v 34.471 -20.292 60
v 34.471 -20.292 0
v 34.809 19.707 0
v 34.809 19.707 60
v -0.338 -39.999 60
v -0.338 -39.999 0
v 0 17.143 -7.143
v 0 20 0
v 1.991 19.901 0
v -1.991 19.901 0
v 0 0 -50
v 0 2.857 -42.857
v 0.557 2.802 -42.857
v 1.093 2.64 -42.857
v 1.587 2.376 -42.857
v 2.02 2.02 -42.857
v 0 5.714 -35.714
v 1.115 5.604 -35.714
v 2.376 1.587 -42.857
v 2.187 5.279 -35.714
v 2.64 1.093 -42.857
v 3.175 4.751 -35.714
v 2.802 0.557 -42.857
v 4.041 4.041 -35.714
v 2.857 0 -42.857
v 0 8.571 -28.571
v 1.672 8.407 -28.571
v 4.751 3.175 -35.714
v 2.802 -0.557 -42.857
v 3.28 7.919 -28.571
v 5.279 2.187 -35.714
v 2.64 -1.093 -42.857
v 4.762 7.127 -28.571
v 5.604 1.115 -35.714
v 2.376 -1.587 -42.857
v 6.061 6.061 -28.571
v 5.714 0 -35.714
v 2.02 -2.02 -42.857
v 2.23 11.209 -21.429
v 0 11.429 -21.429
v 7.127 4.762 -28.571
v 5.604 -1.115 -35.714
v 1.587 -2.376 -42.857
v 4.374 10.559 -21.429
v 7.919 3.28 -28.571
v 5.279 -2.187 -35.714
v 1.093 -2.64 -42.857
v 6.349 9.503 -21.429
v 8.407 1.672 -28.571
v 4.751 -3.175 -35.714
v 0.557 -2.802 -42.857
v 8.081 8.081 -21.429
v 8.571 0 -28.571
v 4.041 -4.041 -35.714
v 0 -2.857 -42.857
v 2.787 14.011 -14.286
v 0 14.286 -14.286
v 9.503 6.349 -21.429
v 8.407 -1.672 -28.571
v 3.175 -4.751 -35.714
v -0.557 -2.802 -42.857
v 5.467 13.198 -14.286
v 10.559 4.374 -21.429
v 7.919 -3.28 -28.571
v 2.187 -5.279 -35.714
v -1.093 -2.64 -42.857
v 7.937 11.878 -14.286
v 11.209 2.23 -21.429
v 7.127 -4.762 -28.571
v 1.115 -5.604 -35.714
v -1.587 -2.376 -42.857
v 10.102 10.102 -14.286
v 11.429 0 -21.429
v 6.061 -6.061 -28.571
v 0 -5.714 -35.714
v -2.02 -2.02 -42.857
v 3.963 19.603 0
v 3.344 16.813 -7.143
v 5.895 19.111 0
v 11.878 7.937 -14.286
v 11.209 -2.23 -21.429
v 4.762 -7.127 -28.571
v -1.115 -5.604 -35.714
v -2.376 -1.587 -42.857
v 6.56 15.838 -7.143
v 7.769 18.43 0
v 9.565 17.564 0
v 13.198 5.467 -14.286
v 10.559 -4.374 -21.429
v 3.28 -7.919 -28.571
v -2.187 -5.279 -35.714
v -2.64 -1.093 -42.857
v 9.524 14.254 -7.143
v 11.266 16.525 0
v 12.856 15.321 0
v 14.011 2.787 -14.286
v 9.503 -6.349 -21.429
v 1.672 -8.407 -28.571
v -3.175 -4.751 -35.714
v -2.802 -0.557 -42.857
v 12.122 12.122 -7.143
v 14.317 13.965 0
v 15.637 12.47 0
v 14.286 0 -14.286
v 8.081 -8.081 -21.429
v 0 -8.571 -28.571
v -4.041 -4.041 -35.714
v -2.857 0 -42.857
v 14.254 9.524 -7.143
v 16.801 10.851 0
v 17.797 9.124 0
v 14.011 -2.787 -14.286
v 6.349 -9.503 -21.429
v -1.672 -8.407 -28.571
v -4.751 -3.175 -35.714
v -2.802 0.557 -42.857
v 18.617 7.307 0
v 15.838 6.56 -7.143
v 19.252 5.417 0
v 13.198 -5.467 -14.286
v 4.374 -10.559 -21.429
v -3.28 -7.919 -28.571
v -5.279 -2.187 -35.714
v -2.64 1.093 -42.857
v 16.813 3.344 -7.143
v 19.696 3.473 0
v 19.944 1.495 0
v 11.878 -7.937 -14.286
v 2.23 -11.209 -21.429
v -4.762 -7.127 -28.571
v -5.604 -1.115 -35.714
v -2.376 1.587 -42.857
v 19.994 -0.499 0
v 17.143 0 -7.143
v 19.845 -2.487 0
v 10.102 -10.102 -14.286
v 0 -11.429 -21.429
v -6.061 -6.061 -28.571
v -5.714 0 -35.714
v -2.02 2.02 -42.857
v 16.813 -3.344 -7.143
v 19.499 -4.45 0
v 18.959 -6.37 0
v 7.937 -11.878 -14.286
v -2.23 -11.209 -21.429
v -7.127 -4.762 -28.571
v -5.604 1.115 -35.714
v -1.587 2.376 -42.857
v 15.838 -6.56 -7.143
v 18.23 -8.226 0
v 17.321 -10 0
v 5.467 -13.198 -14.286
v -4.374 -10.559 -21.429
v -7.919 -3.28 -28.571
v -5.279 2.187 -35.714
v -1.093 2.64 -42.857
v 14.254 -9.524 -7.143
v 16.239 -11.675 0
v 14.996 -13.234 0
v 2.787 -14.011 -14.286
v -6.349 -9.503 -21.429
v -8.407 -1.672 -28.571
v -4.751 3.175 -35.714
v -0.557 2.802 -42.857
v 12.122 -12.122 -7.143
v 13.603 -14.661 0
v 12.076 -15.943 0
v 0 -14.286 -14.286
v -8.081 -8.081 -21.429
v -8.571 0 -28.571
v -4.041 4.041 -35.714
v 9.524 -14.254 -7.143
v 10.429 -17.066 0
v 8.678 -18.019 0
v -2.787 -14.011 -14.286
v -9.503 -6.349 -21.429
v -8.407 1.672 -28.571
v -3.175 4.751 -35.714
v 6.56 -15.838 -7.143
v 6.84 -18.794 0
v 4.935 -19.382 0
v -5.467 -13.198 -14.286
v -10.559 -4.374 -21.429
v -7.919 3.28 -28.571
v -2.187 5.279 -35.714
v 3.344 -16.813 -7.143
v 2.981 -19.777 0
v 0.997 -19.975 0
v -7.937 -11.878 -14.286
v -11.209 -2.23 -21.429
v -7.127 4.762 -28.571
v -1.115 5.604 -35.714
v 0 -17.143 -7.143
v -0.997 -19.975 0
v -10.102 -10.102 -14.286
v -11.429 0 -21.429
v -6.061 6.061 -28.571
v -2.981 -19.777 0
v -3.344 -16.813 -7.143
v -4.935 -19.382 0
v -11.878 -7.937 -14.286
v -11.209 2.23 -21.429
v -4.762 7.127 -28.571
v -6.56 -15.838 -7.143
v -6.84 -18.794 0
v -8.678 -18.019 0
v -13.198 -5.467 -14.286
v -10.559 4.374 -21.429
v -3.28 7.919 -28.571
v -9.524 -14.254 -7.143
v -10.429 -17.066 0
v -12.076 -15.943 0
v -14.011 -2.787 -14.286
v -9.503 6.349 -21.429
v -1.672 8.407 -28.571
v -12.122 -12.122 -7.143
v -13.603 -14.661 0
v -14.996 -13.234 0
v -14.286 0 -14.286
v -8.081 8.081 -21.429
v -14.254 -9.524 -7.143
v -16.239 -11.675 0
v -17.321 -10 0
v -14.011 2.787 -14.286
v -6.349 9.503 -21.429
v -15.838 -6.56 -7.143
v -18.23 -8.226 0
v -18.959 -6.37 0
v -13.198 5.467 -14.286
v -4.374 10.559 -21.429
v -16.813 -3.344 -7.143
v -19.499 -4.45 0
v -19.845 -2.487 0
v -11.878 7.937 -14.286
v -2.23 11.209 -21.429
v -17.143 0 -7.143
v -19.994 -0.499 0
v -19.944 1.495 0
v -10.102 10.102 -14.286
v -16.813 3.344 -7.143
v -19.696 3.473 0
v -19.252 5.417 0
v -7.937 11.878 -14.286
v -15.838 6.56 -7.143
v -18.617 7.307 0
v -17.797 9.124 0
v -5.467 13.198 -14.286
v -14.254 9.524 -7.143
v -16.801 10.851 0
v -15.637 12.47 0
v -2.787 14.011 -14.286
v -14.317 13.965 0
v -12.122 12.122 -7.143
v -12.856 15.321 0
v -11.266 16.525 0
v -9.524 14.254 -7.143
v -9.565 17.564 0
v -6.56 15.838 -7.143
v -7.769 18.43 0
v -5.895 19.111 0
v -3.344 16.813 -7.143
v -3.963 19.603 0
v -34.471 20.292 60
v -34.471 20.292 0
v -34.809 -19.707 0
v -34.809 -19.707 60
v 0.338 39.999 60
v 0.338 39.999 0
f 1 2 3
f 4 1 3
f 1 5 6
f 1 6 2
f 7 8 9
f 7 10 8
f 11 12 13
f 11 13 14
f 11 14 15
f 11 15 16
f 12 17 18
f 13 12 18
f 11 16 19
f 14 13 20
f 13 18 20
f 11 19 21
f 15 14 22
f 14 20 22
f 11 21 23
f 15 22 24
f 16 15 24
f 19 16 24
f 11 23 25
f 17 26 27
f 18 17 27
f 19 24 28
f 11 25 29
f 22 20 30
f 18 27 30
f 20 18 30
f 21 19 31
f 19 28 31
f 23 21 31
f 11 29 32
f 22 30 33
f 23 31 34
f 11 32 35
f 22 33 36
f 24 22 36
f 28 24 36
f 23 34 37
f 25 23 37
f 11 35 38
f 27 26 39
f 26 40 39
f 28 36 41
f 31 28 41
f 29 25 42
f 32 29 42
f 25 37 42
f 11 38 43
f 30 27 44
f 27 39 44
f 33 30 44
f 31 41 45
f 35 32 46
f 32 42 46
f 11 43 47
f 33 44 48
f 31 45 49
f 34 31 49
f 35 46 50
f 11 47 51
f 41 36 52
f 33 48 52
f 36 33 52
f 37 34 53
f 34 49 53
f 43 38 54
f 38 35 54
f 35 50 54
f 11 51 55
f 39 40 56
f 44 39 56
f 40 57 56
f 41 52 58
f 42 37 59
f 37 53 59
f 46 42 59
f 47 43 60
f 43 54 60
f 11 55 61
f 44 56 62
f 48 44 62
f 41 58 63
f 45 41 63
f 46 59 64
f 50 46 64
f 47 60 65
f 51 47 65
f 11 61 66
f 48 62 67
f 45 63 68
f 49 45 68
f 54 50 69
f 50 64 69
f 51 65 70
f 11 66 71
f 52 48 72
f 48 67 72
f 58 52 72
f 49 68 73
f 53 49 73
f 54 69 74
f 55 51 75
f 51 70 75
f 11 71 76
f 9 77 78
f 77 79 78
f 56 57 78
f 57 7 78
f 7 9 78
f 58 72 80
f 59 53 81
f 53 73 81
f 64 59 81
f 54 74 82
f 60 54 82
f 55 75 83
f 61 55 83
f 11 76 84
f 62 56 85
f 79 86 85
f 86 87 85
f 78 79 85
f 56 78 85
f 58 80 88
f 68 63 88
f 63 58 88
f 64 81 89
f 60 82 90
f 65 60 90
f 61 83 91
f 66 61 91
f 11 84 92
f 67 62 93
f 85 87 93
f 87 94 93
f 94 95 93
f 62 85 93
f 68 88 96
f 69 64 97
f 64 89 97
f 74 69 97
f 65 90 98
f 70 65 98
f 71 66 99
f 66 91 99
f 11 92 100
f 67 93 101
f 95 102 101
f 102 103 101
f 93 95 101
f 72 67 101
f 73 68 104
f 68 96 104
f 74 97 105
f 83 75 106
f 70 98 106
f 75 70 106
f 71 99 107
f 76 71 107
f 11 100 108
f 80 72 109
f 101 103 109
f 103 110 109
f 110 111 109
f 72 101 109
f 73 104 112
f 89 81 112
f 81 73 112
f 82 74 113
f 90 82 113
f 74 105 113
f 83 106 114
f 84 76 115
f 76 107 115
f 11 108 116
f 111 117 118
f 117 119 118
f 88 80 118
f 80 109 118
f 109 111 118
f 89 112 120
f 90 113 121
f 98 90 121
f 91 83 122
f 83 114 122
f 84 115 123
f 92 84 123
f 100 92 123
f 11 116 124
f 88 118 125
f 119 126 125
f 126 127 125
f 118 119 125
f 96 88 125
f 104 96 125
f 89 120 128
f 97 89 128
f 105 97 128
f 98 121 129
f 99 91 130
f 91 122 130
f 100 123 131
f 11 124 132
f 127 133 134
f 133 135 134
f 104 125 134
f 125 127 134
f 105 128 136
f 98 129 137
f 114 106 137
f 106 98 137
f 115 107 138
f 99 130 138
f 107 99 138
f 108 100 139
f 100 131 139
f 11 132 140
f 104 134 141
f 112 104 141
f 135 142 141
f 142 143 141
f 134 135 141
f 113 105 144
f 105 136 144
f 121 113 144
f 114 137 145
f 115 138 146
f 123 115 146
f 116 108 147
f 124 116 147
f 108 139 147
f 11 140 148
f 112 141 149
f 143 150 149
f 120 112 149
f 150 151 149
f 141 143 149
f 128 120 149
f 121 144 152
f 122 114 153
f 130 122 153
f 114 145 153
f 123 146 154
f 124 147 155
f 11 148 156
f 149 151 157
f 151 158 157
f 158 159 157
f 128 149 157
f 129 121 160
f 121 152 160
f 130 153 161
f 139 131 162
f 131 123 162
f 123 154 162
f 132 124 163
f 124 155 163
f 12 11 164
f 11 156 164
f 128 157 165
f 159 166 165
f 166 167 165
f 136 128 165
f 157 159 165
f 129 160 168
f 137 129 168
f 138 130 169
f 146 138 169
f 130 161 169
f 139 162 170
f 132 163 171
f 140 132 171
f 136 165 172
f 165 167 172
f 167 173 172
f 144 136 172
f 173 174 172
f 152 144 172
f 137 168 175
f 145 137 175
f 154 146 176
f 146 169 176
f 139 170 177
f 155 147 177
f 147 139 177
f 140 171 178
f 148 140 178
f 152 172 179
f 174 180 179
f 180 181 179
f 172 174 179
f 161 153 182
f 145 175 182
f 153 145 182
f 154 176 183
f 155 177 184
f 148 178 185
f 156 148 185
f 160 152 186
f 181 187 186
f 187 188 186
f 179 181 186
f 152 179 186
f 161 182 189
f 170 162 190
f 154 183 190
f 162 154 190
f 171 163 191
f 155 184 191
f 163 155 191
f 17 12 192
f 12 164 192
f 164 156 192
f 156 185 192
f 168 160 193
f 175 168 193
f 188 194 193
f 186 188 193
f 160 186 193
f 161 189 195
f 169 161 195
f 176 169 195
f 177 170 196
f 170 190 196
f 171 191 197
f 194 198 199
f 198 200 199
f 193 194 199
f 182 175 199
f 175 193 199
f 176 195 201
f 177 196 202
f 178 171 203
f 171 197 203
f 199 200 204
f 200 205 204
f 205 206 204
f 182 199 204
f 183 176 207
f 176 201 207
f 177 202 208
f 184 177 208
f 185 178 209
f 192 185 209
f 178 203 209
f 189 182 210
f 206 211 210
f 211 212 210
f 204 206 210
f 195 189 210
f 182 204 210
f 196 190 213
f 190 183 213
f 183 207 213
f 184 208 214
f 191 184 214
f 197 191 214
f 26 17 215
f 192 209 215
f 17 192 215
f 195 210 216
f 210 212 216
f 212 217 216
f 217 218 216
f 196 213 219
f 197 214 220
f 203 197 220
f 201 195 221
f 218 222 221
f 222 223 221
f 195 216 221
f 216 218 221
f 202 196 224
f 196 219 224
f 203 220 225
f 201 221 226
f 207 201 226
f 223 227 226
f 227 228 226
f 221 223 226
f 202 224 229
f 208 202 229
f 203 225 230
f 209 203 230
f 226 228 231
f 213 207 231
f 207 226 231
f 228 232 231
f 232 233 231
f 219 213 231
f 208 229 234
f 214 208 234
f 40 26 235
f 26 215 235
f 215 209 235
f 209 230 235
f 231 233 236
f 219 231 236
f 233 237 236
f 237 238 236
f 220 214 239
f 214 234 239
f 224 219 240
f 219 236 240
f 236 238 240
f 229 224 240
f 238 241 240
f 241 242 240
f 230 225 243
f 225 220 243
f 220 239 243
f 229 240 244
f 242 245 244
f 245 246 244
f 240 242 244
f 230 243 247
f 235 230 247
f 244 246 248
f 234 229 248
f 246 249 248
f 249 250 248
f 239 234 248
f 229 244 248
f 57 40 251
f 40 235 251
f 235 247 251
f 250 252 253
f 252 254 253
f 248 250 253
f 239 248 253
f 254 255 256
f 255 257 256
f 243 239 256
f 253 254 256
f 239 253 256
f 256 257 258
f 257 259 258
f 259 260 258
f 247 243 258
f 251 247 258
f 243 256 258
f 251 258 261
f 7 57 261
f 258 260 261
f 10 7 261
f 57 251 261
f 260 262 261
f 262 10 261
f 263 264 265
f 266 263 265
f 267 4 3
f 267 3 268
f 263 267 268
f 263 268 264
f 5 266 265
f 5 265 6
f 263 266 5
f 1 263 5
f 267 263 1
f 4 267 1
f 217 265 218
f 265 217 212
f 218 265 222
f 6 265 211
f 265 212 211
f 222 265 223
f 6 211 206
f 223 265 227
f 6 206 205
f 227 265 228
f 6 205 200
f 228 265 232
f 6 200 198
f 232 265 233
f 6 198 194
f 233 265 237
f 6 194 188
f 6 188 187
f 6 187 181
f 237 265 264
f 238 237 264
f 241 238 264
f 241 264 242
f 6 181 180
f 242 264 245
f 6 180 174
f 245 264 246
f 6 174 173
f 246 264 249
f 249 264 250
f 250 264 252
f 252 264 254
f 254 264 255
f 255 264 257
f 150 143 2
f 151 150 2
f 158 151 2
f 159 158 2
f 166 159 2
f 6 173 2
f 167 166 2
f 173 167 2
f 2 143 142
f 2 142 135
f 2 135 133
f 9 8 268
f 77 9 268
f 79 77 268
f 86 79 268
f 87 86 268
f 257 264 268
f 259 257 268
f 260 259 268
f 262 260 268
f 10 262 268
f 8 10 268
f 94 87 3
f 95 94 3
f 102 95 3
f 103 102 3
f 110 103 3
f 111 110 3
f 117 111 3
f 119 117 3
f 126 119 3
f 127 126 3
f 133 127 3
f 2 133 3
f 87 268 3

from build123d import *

# Parameters (mm, degrees)
F1_DEPTH = 60


with BuildPart() as f1:
    # F0 (on Top) → F1 (new body)
    with BuildSketch(Plane.XY):
        Polygon((-0.338009, -39.998572), (34.470775, -20.29201), (34.808784, 19.706562), (0.338009, 39.998572), (-34.470775, 20.29201), (-34.808784, -19.706562), align=None)
    extrude(amount=F1_DEPTH)

    # F2 (on Right) → F3 (revolve)
    with BuildSketch(Plane.YZ):
        Polygon((20, 0), (0, 0), (0, -50), align=None)
    revolve(axis=Axis((0, 0, -25), (0, 0, -1)))


solid = f1.part
